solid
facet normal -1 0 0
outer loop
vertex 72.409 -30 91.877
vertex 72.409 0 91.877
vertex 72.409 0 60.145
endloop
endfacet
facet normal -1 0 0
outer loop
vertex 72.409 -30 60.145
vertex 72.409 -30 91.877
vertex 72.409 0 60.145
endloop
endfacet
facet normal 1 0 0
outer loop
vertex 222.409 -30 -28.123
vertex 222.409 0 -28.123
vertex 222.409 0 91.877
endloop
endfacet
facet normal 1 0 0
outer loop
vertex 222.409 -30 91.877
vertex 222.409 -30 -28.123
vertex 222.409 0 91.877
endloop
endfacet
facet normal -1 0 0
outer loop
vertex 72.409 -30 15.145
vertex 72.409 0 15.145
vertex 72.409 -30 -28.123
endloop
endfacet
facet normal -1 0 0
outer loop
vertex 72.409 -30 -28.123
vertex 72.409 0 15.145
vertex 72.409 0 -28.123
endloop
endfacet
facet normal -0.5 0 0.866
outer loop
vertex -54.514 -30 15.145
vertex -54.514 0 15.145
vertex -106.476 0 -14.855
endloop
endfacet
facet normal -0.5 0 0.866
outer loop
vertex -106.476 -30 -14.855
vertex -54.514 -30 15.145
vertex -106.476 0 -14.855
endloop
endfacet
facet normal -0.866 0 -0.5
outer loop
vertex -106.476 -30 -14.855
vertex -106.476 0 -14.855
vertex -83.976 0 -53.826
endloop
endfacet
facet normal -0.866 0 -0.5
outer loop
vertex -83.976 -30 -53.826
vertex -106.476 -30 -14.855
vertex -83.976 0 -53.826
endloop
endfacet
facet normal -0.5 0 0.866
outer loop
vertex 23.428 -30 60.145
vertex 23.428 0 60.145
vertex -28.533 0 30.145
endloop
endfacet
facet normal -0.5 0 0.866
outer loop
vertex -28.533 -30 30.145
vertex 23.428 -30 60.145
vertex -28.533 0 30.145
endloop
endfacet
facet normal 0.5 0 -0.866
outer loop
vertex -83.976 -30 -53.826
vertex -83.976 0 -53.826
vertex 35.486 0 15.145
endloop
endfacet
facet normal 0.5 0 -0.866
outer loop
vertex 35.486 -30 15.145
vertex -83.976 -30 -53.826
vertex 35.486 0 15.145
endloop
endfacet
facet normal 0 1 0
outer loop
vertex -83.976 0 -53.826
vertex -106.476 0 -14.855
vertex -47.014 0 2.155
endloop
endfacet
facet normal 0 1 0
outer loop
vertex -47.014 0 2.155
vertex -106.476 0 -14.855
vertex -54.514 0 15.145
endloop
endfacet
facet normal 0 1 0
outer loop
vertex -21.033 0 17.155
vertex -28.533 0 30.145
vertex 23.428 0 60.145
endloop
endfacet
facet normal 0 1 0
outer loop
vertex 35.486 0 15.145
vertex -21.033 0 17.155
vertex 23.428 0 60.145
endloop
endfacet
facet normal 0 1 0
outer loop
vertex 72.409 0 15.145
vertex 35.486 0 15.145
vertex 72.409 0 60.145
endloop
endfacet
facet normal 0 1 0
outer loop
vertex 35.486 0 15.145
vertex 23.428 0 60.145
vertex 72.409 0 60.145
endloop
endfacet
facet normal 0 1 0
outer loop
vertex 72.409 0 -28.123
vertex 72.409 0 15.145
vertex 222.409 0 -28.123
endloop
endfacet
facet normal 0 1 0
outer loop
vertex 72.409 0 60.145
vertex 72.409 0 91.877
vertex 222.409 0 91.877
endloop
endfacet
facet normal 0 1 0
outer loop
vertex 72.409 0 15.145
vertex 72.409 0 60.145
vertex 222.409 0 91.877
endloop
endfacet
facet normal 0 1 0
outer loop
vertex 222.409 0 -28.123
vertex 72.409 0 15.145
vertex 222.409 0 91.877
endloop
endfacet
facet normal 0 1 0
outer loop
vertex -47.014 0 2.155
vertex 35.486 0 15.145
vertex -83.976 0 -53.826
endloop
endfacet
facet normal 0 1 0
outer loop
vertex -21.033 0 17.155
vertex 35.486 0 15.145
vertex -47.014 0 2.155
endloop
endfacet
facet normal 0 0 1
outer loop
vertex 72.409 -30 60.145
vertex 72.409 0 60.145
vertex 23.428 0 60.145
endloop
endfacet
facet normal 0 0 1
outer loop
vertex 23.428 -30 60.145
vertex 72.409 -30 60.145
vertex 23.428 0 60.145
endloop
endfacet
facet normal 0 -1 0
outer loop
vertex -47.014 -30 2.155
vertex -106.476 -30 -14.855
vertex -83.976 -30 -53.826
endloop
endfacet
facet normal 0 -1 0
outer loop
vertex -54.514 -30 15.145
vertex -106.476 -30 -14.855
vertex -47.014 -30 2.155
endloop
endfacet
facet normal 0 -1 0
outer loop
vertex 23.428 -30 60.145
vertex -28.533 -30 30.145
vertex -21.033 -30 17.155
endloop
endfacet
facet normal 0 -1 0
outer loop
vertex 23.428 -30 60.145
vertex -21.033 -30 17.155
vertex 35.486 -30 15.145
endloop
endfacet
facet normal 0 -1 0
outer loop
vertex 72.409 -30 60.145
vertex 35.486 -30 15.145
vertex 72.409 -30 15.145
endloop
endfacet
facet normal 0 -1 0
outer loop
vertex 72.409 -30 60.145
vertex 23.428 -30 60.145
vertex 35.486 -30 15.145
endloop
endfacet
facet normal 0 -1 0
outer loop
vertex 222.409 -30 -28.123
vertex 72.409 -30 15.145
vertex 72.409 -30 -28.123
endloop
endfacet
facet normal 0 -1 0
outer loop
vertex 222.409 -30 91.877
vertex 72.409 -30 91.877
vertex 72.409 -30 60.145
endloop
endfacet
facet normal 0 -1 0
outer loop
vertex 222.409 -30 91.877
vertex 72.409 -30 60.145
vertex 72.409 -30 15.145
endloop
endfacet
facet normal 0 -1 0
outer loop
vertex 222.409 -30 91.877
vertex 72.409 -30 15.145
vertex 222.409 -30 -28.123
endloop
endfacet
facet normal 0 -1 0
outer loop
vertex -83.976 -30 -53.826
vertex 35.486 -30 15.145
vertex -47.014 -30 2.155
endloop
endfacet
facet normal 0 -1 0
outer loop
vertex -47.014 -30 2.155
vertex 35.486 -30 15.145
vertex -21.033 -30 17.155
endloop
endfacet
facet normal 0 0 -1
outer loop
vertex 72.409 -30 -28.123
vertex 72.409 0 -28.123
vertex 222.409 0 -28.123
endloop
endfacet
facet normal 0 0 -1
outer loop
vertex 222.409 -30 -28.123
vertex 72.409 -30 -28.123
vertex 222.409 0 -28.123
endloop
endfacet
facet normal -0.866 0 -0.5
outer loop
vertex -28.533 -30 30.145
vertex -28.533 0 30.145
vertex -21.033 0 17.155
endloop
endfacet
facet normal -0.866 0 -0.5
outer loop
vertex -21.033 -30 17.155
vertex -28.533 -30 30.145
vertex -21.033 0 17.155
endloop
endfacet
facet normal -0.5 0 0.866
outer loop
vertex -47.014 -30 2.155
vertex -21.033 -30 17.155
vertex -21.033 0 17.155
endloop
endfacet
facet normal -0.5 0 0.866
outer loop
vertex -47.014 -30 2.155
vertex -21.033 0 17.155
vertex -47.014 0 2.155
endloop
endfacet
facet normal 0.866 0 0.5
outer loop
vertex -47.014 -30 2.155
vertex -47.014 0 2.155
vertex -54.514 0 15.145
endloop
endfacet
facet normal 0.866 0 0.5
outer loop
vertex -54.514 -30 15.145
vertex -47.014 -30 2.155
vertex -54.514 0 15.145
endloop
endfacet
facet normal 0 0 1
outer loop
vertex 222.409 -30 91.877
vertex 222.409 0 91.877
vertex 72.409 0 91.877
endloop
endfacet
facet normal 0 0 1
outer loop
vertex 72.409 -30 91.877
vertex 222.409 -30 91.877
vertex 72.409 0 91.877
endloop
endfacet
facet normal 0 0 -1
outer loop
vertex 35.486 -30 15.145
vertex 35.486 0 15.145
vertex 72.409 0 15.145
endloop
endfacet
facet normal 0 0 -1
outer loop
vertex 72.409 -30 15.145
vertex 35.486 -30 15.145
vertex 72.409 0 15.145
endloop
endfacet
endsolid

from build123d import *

# Parameters (mm, degrees)
F1_DEPTH = 30


with BuildPart() as f1:
    # F0 (on Front) → F1 (new body)
    with BuildSketch(Plane.XZ):
        Polygon((-54.514028, 15.14498), (-106.475553, -14.85502), (-83.975553, -53.826163), (35.485972, 15.14498), (72.409391, 15.14498), (143.428258, 15.14498), (143.428258, 60.14498), (72.409391, 60.14498), (23.428258, 60.14498), (-28.533266, 30.14498), (-21.033266, 17.154599), (-47.014028, 2.154599), align=None)
        Polygon((143.428258, 15.14498), (72.409391, 15.14498), (72.409391, -28.122669), (222.409391, -28.122669), (222.409391, 91.877331), (72.409391, 91.877331), (72.409391, 84.429644), (72.409391, 60.14498), (143.428258, 60.14498), align=None)
    extrude(amount=F1_DEPTH)


solid = f1.part
